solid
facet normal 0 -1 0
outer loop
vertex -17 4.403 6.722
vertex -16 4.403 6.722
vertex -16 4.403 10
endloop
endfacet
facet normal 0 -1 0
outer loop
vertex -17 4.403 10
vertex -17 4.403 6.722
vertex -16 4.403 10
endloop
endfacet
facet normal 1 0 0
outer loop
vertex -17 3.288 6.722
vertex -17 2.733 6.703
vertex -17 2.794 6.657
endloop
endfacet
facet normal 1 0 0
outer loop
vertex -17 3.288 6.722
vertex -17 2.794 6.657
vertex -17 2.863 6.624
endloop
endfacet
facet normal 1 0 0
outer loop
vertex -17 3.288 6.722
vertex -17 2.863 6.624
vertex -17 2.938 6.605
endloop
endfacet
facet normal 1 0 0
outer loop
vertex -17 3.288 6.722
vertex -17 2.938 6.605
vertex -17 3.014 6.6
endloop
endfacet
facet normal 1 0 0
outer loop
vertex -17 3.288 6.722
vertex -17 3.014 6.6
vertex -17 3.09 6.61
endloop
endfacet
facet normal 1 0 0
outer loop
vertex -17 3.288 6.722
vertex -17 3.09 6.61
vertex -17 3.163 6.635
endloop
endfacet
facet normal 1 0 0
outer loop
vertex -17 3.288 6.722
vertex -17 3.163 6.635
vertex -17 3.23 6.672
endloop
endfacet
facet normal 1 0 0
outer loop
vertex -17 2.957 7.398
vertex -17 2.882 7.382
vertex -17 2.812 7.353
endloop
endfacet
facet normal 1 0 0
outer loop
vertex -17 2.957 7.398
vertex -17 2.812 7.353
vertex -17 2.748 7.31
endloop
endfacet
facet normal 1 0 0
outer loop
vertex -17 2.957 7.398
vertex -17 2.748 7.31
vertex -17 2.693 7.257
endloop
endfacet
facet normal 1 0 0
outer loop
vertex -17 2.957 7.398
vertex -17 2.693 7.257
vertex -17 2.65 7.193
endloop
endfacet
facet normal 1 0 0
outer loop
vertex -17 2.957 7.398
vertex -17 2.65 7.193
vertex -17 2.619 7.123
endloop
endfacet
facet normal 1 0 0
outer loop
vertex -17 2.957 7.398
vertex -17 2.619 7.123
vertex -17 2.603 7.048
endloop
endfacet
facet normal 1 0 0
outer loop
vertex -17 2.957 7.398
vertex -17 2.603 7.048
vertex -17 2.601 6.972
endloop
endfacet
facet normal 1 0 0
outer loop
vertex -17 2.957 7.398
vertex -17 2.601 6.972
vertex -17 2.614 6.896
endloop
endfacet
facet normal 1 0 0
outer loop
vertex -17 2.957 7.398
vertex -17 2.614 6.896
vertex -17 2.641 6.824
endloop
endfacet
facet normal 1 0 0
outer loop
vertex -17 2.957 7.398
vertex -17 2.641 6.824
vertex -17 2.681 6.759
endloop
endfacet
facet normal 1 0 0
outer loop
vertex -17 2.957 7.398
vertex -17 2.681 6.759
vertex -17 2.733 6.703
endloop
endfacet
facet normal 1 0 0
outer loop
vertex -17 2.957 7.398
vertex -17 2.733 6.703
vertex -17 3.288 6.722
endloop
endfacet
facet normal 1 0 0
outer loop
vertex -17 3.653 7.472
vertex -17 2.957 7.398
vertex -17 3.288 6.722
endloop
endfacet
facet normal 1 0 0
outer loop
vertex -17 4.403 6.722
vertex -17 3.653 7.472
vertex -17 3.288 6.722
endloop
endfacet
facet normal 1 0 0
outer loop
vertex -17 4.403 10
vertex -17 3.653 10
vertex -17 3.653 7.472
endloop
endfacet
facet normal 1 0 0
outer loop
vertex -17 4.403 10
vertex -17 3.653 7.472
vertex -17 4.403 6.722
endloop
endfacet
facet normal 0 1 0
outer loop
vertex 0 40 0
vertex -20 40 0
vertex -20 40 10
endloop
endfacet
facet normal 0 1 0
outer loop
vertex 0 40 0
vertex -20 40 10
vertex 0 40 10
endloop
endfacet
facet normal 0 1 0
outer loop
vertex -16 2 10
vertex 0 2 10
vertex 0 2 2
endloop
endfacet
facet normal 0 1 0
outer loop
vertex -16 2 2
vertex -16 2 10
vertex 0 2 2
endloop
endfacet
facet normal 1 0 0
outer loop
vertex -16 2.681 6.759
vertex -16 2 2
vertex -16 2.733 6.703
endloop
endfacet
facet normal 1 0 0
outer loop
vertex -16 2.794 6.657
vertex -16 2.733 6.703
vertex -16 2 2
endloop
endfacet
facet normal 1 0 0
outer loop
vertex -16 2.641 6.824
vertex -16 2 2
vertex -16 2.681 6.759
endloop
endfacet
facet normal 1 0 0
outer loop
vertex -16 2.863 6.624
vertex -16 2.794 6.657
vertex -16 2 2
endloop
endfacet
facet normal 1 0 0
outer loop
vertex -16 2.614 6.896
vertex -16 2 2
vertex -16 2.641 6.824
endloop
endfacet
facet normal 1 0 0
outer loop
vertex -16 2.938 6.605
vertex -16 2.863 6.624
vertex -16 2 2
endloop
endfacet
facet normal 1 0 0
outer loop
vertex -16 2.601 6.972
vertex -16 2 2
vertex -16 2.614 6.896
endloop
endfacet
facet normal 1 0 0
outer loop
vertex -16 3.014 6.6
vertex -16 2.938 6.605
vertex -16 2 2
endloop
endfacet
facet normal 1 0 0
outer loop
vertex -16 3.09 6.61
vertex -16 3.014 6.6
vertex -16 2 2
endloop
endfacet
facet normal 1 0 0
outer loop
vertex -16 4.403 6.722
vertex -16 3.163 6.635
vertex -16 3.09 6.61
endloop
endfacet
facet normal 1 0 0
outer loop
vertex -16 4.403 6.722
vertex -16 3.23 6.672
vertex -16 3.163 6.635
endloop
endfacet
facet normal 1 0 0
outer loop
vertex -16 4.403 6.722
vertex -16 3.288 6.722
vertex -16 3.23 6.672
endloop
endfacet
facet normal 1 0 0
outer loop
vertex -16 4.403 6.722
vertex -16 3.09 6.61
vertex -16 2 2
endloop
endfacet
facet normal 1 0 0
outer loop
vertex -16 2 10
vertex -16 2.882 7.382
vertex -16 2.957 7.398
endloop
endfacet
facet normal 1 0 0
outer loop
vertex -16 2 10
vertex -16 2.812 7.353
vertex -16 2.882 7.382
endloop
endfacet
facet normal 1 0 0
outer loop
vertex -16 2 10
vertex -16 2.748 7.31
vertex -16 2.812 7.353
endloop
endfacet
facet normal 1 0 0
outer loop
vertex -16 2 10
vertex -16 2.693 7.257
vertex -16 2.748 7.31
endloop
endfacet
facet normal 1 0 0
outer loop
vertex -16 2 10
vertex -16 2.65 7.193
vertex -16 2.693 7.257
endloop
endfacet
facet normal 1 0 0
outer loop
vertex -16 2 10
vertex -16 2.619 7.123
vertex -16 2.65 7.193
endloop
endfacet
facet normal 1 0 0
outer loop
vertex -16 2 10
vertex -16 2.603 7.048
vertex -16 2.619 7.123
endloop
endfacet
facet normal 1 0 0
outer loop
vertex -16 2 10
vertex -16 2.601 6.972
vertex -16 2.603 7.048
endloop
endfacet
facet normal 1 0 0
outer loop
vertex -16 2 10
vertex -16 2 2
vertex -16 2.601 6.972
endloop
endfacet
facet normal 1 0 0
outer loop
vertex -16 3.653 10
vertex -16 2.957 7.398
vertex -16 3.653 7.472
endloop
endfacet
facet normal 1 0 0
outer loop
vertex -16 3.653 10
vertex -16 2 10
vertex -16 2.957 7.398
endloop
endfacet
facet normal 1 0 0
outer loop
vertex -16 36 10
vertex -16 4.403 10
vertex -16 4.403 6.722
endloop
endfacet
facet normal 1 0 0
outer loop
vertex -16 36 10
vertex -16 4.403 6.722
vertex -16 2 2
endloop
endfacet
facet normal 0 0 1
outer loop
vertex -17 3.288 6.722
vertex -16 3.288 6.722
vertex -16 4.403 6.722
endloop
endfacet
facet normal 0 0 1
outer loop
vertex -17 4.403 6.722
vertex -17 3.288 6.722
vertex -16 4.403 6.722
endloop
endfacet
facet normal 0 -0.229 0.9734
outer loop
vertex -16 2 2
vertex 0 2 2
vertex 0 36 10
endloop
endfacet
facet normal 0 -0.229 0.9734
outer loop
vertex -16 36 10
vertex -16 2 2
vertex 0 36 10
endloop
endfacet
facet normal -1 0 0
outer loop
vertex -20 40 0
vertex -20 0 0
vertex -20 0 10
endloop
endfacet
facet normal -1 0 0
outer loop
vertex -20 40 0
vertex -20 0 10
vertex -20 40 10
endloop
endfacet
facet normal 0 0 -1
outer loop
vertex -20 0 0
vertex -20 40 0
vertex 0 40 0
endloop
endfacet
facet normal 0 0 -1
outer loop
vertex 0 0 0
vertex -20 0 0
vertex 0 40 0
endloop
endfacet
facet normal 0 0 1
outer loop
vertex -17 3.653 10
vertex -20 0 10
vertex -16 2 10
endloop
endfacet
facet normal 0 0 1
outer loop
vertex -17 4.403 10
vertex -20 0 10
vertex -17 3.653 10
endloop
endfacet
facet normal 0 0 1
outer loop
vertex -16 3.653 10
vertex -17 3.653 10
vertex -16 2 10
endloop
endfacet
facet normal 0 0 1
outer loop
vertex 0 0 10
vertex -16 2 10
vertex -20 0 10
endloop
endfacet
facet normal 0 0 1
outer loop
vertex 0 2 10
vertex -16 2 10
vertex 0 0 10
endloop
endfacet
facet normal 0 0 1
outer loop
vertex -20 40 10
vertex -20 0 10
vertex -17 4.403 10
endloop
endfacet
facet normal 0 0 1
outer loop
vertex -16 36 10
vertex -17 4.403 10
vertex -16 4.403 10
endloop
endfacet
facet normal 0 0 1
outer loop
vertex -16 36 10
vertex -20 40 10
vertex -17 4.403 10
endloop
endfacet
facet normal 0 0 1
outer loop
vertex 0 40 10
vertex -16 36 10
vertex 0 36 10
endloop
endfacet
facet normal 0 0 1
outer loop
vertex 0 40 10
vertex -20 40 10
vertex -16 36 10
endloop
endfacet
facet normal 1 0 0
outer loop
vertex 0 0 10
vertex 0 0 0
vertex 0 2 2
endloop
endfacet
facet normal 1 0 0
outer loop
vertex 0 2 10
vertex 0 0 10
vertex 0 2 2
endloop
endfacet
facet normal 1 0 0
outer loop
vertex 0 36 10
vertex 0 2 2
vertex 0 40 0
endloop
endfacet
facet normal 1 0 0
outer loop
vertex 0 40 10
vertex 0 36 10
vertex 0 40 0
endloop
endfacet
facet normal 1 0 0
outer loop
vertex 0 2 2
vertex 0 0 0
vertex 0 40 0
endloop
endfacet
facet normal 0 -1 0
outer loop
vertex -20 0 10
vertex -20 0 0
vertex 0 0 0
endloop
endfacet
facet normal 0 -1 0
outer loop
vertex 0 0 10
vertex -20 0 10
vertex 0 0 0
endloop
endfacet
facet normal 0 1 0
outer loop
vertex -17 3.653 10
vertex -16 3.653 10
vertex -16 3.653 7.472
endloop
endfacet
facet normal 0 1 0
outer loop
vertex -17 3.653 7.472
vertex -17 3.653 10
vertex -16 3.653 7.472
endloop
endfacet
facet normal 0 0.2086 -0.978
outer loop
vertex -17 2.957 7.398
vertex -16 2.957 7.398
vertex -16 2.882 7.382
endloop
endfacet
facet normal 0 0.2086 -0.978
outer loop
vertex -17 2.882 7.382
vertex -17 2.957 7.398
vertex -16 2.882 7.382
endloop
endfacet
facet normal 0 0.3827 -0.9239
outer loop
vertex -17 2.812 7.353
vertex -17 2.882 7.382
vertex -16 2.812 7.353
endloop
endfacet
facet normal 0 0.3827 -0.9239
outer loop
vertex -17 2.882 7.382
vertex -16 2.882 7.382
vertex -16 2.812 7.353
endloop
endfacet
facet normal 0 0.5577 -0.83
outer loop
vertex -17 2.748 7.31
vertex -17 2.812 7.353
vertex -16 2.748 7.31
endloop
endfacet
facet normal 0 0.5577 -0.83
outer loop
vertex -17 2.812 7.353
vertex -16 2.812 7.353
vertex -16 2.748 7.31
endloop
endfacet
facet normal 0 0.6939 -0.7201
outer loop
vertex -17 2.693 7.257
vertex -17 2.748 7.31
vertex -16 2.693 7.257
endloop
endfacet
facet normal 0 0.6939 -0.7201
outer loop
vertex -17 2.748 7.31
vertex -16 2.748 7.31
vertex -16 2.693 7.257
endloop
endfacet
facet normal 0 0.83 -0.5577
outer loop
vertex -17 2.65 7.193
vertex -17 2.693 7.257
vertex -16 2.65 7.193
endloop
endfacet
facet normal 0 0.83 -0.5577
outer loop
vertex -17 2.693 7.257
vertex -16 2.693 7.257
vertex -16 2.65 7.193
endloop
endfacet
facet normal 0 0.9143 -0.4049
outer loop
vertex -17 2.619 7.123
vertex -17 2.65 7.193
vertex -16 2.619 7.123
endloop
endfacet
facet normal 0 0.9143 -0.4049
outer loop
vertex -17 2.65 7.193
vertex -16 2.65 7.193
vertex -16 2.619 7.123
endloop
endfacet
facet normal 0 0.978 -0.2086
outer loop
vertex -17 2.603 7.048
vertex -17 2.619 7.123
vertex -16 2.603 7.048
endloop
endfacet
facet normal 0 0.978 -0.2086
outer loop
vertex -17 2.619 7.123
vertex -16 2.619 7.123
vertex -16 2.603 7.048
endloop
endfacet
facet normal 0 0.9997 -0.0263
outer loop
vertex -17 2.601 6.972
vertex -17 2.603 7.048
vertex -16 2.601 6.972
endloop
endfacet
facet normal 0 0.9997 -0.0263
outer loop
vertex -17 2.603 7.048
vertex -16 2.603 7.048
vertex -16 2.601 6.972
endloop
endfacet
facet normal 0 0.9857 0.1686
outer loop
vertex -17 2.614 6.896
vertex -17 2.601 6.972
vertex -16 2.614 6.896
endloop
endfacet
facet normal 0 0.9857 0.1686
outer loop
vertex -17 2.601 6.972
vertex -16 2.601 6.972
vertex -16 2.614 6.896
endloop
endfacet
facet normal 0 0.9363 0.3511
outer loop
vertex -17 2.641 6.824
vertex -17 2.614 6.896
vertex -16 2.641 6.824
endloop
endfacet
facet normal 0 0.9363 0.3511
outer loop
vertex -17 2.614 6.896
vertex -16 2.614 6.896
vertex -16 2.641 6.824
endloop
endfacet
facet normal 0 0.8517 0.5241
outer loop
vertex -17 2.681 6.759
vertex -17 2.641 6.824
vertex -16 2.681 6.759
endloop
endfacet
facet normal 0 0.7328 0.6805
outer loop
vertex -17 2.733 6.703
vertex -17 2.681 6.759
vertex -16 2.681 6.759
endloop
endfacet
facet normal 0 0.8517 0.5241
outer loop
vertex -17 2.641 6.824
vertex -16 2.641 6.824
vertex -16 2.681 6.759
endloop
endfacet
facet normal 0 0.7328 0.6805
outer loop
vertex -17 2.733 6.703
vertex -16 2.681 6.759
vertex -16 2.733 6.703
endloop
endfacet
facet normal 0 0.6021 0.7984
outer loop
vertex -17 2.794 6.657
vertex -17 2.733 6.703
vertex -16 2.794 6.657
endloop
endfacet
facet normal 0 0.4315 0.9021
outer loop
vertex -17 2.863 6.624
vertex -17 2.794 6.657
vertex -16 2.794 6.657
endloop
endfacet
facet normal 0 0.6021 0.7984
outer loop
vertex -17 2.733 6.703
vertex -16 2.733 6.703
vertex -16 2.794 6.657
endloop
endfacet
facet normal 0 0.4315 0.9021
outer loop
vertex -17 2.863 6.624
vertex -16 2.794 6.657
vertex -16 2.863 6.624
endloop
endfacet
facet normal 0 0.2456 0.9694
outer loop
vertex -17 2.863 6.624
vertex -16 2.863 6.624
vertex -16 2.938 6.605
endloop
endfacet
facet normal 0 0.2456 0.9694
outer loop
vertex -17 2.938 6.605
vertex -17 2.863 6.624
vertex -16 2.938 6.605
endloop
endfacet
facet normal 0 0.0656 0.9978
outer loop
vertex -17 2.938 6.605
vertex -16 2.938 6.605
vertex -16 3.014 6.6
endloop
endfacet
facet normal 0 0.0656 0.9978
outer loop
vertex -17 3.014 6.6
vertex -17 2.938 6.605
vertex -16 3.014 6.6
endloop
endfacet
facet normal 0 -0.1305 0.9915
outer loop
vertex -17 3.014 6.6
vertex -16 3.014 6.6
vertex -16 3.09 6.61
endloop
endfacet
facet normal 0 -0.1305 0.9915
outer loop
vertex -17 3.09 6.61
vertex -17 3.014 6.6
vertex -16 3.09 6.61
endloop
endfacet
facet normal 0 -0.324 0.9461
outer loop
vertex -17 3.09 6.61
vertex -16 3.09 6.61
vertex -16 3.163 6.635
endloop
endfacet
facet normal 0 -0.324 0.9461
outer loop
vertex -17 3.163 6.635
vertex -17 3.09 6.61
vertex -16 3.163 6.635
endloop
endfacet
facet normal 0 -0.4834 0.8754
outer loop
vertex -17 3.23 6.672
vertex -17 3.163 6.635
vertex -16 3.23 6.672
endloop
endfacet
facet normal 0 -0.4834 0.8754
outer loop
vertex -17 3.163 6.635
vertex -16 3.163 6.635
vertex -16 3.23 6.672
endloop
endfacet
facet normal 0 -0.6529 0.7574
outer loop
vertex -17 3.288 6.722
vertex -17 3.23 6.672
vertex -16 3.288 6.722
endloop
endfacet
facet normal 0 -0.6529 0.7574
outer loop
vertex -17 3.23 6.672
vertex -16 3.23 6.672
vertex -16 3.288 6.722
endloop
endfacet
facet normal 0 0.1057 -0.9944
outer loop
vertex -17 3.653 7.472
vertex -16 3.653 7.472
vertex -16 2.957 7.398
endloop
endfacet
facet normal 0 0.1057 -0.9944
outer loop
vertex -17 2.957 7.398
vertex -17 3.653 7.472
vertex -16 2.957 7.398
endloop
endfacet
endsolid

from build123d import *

# Parameters (mm, degrees)
F0_W     = 20
F0_H     = 40
F1_DEPTH = 10
F3_DEPTH = 16
F5_DEPTH = 1


with BuildPart() as f1:
    # F0 (on Top) → F1 (new body)
    with BuildSketch(Plane.XY):
        with Locations((-10, 20)):
            Rectangle(F0_W, F0_H)
    extrude(amount=F1_DEPTH)

    # F2 (on face) → F3 (cut)
    with BuildSketch(Plane.YZ):
        Polygon((2, 2), (36, 10), (2, 10), align=None)
    extrude(amount=-F3_DEPTH, mode=Mode.SUBTRACT)

    # F4 (on face) → F5 (cut)
    with BuildSketch(Plane.YZ.offset(-16)):
        with BuildLine():
            Line((4.403491, 10), (3.653491, 10))
            Line((3.653491, 10), (3.653491, 7.472175))
            Line((3.653491, 7.472175), (2.957461, 7.397732))
            ThreePointArc((2.957461, 7.397732), (2.640655, 6.824299), (3.287773, 6.722175))
            Line((3.287773, 6.722175), (4.403491, 6.722175))
            Line((4.403491, 6.722175), (4.403491, 10))
        make_face()
    extrude(amount=-F5_DEPTH, mode=Mode.SUBTRACT)


solid = f1.part
